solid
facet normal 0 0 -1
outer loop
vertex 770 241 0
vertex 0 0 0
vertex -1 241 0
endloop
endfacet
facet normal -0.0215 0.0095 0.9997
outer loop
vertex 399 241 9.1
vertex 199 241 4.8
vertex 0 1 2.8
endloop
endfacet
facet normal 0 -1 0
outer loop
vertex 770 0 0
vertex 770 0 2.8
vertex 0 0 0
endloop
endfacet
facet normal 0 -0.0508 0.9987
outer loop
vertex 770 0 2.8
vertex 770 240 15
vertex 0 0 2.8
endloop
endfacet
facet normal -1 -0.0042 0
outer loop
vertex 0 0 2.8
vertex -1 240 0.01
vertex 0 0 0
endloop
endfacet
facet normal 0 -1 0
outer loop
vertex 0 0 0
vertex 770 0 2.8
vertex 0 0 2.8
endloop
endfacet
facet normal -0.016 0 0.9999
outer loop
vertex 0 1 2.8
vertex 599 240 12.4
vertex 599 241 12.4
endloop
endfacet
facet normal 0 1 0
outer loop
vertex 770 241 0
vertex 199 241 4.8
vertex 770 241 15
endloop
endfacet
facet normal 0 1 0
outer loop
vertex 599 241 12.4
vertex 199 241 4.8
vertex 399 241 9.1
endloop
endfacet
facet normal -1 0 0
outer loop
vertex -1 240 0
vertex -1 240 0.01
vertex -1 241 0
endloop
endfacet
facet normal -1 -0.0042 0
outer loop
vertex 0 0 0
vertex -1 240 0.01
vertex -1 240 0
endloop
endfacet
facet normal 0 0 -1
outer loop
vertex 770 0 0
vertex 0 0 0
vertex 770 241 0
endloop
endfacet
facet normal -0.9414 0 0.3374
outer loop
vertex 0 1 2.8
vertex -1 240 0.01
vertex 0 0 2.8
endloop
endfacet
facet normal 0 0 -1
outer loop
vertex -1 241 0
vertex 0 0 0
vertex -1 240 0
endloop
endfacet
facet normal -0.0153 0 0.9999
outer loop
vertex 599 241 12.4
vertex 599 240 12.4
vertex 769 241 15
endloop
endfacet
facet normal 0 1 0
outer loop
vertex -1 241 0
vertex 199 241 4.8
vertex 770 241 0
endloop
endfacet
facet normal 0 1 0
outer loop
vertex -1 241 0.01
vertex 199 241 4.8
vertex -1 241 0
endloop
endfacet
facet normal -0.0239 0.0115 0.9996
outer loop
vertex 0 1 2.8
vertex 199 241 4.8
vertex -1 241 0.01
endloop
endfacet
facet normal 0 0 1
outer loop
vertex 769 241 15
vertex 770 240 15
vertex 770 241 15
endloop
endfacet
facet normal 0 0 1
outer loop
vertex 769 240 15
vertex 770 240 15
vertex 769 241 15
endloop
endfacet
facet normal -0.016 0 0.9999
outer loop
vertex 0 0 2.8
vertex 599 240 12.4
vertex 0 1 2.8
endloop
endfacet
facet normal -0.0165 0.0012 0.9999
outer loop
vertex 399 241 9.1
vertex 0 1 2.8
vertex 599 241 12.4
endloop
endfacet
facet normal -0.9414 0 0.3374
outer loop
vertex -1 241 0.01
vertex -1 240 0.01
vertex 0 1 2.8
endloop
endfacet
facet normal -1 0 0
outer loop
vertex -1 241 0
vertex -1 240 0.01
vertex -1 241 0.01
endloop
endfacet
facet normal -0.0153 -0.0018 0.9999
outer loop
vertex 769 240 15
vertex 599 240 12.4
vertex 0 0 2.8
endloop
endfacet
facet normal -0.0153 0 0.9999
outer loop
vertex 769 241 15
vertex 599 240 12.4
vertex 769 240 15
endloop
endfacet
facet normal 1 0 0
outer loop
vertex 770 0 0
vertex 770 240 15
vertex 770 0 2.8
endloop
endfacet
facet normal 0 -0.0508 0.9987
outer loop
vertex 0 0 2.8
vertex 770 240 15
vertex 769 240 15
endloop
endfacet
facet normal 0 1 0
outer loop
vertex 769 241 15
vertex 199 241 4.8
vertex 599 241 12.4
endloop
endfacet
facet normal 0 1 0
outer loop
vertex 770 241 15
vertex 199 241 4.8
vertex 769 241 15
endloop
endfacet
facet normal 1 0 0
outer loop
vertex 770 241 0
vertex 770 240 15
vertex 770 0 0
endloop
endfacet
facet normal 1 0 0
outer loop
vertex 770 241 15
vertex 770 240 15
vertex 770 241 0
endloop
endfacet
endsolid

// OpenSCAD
module ramp() {
    module topRow() {
        translate([0,0,0]) cube([1,1,0.01]);
        translate([100,0,0]) cube([1,1,1.7]);
        translate([200,0,0]) cube([1,1,4.8]);
        translate([300,0,0]) cube([1,1,6.6]);
        translate([400,0,0]) cube([1,1,9.1]);
        translate([500,0,0]) cube([1,1,9.6]);
        translate([600,0,0]) cube([1,1,12.4]);
        translate([700,0,0]) cube([1,1,13.4]);
        translate([770,0,0]) cube([1,1,15]);
    }

    hull() {
        translate([-1,242-2,0]) topRow();
        cube([770,1,2.8]);
    }
}

ramp();

//intersection() {
//    translate([121*0,121*1,0])cube([121,121,121]);
//    ramp();
//}
